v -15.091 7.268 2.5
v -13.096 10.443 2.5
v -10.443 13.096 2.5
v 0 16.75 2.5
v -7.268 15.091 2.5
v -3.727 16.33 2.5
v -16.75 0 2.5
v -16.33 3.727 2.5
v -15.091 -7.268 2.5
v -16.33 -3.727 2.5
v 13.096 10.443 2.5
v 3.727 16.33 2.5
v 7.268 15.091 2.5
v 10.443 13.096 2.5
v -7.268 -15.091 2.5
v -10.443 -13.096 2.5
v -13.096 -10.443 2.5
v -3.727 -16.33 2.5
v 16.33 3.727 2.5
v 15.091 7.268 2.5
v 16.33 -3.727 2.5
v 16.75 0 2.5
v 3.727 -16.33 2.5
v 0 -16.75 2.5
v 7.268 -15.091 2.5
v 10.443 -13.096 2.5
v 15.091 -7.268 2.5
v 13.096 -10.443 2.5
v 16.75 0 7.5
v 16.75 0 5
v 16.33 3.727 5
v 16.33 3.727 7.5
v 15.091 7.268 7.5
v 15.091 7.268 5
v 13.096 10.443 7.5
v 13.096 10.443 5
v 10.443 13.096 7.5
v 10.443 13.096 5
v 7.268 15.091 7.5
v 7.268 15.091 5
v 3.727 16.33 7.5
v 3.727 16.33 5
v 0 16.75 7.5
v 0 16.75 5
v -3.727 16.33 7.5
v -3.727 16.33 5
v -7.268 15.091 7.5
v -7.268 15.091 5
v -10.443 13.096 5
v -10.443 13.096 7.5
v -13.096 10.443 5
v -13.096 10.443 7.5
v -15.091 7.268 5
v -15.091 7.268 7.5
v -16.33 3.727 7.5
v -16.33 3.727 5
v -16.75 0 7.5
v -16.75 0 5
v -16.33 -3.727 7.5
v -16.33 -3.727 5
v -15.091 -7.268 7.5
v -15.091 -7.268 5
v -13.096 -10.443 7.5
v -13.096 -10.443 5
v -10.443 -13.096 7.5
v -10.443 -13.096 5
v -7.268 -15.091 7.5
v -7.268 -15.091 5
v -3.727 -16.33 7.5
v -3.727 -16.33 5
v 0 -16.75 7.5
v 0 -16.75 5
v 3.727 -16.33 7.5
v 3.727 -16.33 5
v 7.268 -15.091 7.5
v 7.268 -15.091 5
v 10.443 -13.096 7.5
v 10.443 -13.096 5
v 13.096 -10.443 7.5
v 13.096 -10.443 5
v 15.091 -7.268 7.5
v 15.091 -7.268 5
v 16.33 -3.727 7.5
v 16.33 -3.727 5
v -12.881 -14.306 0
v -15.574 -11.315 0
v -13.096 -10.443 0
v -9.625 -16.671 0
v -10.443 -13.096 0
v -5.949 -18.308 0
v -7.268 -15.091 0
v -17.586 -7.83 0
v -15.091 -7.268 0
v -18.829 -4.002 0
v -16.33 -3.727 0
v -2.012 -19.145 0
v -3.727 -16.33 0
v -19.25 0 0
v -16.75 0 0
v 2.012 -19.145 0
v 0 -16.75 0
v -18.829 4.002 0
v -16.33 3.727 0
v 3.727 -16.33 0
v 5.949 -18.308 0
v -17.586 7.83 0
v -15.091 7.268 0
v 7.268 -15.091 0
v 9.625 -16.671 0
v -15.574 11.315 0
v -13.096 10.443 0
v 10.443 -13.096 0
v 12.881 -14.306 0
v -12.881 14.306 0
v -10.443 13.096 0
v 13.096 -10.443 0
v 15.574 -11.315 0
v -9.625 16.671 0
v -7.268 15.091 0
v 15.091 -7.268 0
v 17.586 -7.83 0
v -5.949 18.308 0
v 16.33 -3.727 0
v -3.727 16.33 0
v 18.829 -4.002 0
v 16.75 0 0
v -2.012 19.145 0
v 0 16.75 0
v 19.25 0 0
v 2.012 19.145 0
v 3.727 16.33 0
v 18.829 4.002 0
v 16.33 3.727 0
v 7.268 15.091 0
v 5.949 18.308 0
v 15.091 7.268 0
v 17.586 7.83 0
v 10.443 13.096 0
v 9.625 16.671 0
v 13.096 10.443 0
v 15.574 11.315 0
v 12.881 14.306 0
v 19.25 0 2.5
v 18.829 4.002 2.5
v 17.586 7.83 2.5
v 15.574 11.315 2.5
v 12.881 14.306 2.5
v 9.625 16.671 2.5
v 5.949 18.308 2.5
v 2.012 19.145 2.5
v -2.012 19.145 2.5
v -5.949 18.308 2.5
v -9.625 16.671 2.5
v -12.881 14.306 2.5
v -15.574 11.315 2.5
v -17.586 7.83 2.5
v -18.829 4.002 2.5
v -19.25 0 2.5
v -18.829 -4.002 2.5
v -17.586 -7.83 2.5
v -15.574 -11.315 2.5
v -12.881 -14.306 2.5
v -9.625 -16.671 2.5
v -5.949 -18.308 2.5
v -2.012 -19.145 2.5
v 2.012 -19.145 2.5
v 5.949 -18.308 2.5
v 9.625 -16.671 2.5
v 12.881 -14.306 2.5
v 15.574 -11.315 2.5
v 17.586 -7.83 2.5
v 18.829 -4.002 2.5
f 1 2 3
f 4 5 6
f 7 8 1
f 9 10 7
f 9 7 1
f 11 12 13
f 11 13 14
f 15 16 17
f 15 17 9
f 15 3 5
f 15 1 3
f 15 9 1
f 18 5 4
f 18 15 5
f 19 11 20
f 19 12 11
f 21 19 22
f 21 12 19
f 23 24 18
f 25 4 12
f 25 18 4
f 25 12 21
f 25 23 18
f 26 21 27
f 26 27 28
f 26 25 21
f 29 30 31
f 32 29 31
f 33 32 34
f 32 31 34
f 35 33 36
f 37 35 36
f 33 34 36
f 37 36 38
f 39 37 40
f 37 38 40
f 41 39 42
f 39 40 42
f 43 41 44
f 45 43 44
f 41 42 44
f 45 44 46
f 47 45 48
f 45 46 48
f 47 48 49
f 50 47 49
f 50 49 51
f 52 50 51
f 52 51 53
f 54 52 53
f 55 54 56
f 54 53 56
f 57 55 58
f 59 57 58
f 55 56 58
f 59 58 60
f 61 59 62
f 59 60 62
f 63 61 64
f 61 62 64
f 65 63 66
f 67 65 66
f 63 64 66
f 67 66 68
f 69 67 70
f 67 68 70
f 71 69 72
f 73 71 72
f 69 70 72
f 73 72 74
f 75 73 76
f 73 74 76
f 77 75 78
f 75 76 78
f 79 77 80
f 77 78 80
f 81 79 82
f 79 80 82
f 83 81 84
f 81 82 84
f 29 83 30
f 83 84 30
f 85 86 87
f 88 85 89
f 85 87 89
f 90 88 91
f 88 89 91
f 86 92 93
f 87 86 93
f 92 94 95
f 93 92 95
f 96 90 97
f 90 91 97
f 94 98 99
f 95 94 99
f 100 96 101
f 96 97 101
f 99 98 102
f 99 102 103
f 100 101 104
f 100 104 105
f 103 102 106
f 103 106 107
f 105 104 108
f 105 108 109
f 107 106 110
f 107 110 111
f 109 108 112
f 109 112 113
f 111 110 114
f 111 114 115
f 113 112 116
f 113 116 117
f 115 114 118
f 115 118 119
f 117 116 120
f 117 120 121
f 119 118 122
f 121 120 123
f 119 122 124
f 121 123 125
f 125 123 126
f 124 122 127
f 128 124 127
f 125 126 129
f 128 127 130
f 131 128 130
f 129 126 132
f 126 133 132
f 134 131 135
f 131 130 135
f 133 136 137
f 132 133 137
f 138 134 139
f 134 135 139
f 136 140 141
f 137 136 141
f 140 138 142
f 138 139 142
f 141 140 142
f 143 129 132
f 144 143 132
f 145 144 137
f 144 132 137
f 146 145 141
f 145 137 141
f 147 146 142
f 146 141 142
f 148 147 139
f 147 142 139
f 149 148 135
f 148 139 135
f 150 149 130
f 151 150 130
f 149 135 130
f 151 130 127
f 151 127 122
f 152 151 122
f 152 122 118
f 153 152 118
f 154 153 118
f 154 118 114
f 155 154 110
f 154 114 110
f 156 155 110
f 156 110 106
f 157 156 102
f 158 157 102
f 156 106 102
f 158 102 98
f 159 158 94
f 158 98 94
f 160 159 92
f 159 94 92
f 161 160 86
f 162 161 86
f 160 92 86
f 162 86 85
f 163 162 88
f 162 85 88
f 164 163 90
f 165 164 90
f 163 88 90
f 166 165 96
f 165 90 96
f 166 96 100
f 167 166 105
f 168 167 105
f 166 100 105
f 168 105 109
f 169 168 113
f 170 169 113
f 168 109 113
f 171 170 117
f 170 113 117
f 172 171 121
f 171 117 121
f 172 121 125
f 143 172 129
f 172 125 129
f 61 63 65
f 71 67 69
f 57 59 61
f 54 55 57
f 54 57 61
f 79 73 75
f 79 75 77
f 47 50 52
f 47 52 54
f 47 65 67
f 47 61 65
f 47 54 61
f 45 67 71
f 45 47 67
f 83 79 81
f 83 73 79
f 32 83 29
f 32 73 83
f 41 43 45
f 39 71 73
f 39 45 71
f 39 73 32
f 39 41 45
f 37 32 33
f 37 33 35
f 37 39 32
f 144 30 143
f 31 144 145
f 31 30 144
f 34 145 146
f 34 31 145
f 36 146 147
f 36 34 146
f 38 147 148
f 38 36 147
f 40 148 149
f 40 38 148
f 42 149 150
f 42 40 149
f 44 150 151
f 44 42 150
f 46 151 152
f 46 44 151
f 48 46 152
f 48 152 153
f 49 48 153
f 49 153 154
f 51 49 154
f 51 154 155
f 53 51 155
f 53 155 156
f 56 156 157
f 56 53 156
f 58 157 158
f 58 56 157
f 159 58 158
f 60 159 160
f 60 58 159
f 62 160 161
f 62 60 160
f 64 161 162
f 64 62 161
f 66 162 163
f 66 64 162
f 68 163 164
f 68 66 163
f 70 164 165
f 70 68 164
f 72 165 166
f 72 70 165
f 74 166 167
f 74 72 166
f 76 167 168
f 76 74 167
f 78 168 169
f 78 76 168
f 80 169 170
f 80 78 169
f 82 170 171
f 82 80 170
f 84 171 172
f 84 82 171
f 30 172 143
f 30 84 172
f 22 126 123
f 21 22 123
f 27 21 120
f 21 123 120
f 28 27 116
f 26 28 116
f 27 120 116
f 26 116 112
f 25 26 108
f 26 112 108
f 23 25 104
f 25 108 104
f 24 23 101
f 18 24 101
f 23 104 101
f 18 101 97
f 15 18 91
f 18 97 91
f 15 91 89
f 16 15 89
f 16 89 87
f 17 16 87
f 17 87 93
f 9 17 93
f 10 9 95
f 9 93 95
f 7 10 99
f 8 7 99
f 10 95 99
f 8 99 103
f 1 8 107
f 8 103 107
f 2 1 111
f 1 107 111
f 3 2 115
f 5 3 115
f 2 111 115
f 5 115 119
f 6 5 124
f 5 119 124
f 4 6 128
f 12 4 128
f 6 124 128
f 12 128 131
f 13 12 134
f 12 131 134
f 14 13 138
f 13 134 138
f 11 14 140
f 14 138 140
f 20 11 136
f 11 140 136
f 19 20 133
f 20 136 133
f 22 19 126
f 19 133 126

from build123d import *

# Parameters (mm, degrees)
F0_R     = 19.25
F1_DEPTH = 5
F2_R     = 16.75
F3_DEPTH = 2.5
F4_R     = 16.75
F5_DEPTH = 2.5
F6_SIZE  = 2.49999


# Not quite as in the source:
# - a fillet or chamfer is up to 0.001 mm smaller than in the source, because OpenCascade refuses the exact size


with BuildPart() as f1:
    # F0 (on Top) → F1 (new body)
    with BuildSketch(Plane.XY):
        Circle(F0_R)
    extrude(amount=F1_DEPTH)

    # F2 (on face) → F3 (join)
    with BuildSketch(Plane.XY.offset(5)):
        Circle(F2_R)
    extrude(amount=F3_DEPTH)

    # F4 (on face) → F5 (cut)
    with BuildSketch(Plane(origin=(0, 0, 0), x_dir=(1, 0, 0), z_dir=(0, 0, -1))):
        Circle(F4_R)
    extrude(amount=-F5_DEPTH, mode=Mode.SUBTRACT)

    # F6 (size 2.5 in the source; OpenCascade refuses exactly that, so slightly less here)
    f6_edges = [f1.edges().sort_by_distance(p)[0] for p in [
        (-19.25, 0, 5),
    ]]
    chamfer(f6_edges, length=F6_SIZE)


solid = f1.part
